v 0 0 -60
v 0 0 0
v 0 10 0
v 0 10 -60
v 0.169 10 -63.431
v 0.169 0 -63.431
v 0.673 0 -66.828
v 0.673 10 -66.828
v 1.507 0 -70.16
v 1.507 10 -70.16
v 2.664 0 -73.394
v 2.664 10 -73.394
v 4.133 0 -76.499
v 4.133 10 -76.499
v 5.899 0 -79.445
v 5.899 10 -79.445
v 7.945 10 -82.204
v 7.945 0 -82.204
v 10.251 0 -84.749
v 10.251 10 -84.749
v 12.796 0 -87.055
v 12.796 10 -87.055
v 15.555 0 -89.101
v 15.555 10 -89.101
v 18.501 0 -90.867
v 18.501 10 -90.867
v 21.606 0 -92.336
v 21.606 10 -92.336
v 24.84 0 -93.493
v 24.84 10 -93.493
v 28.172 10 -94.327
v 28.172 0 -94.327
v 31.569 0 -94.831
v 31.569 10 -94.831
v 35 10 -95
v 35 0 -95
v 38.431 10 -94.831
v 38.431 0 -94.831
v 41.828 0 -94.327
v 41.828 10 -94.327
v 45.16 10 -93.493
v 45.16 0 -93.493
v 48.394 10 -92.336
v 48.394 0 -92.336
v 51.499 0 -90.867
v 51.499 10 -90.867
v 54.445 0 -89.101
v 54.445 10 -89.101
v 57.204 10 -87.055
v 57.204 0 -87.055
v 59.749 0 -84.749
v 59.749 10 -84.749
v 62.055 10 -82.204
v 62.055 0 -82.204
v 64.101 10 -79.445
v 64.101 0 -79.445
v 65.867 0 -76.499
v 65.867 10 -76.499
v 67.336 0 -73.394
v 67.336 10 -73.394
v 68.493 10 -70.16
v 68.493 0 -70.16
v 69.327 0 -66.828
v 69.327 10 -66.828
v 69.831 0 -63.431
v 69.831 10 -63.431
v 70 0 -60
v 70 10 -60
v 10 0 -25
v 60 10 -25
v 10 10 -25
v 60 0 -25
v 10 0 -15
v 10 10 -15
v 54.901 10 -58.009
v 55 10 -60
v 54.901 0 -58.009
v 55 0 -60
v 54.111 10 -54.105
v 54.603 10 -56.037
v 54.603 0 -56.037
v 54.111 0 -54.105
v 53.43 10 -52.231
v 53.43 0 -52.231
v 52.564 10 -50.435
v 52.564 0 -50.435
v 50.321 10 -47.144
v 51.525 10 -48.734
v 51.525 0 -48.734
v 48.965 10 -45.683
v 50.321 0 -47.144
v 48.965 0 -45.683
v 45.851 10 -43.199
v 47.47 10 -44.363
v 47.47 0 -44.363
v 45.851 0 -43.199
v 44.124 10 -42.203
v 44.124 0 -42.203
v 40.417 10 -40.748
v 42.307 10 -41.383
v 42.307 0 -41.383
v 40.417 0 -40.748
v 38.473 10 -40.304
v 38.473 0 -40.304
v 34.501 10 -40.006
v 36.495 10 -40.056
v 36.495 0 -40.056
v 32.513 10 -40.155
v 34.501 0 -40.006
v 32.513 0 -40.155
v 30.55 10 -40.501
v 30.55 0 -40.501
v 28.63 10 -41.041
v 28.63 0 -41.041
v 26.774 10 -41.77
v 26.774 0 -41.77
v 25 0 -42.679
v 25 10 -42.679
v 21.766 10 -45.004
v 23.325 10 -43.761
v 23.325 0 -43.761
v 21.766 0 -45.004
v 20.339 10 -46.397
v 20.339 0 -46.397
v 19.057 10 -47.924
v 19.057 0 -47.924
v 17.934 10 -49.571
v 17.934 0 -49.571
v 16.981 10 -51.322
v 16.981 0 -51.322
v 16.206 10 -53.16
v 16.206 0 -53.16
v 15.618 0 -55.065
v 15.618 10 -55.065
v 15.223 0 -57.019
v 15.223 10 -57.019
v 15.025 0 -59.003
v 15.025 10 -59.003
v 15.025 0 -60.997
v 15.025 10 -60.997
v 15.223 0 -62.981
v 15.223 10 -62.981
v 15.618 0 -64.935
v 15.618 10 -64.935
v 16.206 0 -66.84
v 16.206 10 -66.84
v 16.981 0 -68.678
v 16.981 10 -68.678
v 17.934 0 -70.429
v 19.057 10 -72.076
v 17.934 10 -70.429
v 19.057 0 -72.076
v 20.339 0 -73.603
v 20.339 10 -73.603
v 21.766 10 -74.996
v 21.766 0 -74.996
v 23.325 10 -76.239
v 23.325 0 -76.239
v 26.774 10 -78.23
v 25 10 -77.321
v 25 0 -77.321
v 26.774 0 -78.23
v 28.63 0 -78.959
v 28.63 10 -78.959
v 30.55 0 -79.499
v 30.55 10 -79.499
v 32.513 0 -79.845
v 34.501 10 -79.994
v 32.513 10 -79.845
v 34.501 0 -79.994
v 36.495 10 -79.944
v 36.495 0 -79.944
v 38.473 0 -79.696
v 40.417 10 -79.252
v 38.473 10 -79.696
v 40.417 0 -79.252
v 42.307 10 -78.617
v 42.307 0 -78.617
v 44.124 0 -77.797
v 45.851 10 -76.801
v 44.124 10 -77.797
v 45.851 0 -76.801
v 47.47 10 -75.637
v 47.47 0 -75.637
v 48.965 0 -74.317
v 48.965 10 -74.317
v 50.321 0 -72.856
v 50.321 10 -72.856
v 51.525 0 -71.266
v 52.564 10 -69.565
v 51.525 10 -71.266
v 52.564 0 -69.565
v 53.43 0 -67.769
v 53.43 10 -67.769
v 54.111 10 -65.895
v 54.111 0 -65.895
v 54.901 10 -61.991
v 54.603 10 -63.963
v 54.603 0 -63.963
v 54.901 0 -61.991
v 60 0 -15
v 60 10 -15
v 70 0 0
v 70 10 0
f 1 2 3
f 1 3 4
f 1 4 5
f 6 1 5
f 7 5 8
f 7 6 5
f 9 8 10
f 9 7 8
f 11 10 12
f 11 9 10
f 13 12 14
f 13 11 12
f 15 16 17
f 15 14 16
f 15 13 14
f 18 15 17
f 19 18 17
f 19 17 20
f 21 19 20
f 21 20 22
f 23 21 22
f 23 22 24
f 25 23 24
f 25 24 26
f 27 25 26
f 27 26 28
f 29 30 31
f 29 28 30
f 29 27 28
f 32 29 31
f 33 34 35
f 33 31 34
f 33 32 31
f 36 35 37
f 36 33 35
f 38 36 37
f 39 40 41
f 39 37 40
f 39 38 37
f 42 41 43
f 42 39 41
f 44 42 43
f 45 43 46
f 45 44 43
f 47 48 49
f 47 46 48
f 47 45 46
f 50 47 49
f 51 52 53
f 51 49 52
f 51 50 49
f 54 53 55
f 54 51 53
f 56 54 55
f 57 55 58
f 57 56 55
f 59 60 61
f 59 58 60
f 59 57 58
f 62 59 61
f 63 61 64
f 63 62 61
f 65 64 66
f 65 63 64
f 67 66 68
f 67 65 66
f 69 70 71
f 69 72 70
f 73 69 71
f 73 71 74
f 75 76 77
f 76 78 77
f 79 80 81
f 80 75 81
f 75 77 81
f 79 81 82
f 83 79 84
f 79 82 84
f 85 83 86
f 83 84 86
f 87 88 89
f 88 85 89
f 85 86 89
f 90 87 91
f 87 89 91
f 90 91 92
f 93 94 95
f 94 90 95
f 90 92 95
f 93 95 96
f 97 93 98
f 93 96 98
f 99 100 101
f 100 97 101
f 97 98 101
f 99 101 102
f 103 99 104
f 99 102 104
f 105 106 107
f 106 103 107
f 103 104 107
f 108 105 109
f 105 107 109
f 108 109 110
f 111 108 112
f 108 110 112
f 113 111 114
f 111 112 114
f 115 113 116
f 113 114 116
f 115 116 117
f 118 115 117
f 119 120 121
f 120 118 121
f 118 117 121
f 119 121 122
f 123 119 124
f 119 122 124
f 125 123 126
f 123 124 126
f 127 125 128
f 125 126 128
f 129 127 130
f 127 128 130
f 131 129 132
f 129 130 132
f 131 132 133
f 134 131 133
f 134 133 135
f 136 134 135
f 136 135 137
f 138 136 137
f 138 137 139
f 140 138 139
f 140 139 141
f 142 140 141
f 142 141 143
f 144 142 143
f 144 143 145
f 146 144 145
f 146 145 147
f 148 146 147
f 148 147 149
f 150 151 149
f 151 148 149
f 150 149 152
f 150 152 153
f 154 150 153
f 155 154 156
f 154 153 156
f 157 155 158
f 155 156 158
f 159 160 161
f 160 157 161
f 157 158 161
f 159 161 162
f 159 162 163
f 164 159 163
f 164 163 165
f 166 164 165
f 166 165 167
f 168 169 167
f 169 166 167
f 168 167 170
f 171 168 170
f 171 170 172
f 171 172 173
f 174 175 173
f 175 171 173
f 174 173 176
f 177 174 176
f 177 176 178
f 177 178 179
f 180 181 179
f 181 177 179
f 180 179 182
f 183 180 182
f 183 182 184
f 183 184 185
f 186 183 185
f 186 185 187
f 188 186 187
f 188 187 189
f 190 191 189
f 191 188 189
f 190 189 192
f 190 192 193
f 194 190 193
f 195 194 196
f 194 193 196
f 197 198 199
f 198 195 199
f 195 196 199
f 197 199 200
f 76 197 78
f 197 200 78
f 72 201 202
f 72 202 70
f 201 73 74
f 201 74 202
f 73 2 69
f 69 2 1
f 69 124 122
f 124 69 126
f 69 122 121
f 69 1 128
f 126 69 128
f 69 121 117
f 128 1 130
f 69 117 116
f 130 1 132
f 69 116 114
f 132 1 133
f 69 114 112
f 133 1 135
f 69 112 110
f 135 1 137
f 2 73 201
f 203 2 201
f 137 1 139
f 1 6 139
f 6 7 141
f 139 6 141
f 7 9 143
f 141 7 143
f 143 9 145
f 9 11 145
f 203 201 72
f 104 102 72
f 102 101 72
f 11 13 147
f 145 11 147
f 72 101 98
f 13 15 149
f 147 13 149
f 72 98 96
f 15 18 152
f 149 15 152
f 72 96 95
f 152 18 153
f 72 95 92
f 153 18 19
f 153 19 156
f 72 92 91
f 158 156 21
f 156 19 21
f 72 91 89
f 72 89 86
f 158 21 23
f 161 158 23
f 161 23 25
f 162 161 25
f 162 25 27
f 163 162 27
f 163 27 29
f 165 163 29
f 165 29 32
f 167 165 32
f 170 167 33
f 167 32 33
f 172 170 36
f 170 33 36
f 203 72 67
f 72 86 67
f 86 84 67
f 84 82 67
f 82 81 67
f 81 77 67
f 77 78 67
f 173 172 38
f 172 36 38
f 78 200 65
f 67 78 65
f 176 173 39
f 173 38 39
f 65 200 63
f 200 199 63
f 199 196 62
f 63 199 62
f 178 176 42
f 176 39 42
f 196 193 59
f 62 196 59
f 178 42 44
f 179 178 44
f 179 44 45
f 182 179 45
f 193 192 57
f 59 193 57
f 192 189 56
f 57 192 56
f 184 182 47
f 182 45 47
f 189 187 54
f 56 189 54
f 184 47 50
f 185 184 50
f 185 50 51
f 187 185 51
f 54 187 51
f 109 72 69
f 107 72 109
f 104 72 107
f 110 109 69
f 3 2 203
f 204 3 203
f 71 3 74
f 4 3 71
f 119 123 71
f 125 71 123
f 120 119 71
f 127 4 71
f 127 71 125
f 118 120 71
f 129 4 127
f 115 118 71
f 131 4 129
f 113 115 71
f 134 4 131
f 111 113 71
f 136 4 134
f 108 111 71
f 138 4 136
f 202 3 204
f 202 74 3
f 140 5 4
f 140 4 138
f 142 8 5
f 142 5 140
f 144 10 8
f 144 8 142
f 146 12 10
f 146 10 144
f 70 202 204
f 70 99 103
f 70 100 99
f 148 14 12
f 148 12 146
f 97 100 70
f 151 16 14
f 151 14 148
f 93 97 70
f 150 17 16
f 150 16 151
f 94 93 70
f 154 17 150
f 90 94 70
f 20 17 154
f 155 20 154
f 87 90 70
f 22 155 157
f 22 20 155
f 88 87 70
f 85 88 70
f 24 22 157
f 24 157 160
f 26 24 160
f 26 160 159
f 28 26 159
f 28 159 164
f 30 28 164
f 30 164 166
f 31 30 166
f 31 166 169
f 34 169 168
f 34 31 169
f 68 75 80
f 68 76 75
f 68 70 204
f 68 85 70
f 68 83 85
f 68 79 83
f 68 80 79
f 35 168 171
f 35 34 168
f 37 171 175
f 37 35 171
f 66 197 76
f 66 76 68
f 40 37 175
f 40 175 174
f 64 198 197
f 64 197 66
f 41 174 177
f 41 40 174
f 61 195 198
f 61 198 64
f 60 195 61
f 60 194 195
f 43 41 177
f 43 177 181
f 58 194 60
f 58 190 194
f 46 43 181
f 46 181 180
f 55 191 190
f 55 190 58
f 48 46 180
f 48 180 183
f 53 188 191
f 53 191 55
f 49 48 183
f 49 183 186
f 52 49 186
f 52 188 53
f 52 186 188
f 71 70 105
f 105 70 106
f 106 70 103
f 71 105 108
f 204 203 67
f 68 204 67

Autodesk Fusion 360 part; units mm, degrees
sketch "Sketch1" plane through (0, 0, 0) normal (0, 1, 0) x (1, 0, 0)
  line L0 (0, 0) -> (70, 0)
  line L1 (0, 0) -> (0, 60)
  line L2 (70, 0) -> (70, 60)
  circle A0 centre (35, 60) radius 20
  line L3 (60, 15) -> (60, 25)
  line L4 (60, 25) -> (10, 25)
  line L5 (10, 25) -> (10, 15)
  line L6 (10, 15) -> (60, 15)
  arc A1 (70, 60) -> (0, 60) centre (35, 60) ccw
  dimension "d1" = 70
  dimension "d2" = 60
  dimension "d3" = 40
  dimension "d4" = 50
  dimension "d5" = 10
extrude "Extrude1" add sketch "Sketch1" along normal blind 10
